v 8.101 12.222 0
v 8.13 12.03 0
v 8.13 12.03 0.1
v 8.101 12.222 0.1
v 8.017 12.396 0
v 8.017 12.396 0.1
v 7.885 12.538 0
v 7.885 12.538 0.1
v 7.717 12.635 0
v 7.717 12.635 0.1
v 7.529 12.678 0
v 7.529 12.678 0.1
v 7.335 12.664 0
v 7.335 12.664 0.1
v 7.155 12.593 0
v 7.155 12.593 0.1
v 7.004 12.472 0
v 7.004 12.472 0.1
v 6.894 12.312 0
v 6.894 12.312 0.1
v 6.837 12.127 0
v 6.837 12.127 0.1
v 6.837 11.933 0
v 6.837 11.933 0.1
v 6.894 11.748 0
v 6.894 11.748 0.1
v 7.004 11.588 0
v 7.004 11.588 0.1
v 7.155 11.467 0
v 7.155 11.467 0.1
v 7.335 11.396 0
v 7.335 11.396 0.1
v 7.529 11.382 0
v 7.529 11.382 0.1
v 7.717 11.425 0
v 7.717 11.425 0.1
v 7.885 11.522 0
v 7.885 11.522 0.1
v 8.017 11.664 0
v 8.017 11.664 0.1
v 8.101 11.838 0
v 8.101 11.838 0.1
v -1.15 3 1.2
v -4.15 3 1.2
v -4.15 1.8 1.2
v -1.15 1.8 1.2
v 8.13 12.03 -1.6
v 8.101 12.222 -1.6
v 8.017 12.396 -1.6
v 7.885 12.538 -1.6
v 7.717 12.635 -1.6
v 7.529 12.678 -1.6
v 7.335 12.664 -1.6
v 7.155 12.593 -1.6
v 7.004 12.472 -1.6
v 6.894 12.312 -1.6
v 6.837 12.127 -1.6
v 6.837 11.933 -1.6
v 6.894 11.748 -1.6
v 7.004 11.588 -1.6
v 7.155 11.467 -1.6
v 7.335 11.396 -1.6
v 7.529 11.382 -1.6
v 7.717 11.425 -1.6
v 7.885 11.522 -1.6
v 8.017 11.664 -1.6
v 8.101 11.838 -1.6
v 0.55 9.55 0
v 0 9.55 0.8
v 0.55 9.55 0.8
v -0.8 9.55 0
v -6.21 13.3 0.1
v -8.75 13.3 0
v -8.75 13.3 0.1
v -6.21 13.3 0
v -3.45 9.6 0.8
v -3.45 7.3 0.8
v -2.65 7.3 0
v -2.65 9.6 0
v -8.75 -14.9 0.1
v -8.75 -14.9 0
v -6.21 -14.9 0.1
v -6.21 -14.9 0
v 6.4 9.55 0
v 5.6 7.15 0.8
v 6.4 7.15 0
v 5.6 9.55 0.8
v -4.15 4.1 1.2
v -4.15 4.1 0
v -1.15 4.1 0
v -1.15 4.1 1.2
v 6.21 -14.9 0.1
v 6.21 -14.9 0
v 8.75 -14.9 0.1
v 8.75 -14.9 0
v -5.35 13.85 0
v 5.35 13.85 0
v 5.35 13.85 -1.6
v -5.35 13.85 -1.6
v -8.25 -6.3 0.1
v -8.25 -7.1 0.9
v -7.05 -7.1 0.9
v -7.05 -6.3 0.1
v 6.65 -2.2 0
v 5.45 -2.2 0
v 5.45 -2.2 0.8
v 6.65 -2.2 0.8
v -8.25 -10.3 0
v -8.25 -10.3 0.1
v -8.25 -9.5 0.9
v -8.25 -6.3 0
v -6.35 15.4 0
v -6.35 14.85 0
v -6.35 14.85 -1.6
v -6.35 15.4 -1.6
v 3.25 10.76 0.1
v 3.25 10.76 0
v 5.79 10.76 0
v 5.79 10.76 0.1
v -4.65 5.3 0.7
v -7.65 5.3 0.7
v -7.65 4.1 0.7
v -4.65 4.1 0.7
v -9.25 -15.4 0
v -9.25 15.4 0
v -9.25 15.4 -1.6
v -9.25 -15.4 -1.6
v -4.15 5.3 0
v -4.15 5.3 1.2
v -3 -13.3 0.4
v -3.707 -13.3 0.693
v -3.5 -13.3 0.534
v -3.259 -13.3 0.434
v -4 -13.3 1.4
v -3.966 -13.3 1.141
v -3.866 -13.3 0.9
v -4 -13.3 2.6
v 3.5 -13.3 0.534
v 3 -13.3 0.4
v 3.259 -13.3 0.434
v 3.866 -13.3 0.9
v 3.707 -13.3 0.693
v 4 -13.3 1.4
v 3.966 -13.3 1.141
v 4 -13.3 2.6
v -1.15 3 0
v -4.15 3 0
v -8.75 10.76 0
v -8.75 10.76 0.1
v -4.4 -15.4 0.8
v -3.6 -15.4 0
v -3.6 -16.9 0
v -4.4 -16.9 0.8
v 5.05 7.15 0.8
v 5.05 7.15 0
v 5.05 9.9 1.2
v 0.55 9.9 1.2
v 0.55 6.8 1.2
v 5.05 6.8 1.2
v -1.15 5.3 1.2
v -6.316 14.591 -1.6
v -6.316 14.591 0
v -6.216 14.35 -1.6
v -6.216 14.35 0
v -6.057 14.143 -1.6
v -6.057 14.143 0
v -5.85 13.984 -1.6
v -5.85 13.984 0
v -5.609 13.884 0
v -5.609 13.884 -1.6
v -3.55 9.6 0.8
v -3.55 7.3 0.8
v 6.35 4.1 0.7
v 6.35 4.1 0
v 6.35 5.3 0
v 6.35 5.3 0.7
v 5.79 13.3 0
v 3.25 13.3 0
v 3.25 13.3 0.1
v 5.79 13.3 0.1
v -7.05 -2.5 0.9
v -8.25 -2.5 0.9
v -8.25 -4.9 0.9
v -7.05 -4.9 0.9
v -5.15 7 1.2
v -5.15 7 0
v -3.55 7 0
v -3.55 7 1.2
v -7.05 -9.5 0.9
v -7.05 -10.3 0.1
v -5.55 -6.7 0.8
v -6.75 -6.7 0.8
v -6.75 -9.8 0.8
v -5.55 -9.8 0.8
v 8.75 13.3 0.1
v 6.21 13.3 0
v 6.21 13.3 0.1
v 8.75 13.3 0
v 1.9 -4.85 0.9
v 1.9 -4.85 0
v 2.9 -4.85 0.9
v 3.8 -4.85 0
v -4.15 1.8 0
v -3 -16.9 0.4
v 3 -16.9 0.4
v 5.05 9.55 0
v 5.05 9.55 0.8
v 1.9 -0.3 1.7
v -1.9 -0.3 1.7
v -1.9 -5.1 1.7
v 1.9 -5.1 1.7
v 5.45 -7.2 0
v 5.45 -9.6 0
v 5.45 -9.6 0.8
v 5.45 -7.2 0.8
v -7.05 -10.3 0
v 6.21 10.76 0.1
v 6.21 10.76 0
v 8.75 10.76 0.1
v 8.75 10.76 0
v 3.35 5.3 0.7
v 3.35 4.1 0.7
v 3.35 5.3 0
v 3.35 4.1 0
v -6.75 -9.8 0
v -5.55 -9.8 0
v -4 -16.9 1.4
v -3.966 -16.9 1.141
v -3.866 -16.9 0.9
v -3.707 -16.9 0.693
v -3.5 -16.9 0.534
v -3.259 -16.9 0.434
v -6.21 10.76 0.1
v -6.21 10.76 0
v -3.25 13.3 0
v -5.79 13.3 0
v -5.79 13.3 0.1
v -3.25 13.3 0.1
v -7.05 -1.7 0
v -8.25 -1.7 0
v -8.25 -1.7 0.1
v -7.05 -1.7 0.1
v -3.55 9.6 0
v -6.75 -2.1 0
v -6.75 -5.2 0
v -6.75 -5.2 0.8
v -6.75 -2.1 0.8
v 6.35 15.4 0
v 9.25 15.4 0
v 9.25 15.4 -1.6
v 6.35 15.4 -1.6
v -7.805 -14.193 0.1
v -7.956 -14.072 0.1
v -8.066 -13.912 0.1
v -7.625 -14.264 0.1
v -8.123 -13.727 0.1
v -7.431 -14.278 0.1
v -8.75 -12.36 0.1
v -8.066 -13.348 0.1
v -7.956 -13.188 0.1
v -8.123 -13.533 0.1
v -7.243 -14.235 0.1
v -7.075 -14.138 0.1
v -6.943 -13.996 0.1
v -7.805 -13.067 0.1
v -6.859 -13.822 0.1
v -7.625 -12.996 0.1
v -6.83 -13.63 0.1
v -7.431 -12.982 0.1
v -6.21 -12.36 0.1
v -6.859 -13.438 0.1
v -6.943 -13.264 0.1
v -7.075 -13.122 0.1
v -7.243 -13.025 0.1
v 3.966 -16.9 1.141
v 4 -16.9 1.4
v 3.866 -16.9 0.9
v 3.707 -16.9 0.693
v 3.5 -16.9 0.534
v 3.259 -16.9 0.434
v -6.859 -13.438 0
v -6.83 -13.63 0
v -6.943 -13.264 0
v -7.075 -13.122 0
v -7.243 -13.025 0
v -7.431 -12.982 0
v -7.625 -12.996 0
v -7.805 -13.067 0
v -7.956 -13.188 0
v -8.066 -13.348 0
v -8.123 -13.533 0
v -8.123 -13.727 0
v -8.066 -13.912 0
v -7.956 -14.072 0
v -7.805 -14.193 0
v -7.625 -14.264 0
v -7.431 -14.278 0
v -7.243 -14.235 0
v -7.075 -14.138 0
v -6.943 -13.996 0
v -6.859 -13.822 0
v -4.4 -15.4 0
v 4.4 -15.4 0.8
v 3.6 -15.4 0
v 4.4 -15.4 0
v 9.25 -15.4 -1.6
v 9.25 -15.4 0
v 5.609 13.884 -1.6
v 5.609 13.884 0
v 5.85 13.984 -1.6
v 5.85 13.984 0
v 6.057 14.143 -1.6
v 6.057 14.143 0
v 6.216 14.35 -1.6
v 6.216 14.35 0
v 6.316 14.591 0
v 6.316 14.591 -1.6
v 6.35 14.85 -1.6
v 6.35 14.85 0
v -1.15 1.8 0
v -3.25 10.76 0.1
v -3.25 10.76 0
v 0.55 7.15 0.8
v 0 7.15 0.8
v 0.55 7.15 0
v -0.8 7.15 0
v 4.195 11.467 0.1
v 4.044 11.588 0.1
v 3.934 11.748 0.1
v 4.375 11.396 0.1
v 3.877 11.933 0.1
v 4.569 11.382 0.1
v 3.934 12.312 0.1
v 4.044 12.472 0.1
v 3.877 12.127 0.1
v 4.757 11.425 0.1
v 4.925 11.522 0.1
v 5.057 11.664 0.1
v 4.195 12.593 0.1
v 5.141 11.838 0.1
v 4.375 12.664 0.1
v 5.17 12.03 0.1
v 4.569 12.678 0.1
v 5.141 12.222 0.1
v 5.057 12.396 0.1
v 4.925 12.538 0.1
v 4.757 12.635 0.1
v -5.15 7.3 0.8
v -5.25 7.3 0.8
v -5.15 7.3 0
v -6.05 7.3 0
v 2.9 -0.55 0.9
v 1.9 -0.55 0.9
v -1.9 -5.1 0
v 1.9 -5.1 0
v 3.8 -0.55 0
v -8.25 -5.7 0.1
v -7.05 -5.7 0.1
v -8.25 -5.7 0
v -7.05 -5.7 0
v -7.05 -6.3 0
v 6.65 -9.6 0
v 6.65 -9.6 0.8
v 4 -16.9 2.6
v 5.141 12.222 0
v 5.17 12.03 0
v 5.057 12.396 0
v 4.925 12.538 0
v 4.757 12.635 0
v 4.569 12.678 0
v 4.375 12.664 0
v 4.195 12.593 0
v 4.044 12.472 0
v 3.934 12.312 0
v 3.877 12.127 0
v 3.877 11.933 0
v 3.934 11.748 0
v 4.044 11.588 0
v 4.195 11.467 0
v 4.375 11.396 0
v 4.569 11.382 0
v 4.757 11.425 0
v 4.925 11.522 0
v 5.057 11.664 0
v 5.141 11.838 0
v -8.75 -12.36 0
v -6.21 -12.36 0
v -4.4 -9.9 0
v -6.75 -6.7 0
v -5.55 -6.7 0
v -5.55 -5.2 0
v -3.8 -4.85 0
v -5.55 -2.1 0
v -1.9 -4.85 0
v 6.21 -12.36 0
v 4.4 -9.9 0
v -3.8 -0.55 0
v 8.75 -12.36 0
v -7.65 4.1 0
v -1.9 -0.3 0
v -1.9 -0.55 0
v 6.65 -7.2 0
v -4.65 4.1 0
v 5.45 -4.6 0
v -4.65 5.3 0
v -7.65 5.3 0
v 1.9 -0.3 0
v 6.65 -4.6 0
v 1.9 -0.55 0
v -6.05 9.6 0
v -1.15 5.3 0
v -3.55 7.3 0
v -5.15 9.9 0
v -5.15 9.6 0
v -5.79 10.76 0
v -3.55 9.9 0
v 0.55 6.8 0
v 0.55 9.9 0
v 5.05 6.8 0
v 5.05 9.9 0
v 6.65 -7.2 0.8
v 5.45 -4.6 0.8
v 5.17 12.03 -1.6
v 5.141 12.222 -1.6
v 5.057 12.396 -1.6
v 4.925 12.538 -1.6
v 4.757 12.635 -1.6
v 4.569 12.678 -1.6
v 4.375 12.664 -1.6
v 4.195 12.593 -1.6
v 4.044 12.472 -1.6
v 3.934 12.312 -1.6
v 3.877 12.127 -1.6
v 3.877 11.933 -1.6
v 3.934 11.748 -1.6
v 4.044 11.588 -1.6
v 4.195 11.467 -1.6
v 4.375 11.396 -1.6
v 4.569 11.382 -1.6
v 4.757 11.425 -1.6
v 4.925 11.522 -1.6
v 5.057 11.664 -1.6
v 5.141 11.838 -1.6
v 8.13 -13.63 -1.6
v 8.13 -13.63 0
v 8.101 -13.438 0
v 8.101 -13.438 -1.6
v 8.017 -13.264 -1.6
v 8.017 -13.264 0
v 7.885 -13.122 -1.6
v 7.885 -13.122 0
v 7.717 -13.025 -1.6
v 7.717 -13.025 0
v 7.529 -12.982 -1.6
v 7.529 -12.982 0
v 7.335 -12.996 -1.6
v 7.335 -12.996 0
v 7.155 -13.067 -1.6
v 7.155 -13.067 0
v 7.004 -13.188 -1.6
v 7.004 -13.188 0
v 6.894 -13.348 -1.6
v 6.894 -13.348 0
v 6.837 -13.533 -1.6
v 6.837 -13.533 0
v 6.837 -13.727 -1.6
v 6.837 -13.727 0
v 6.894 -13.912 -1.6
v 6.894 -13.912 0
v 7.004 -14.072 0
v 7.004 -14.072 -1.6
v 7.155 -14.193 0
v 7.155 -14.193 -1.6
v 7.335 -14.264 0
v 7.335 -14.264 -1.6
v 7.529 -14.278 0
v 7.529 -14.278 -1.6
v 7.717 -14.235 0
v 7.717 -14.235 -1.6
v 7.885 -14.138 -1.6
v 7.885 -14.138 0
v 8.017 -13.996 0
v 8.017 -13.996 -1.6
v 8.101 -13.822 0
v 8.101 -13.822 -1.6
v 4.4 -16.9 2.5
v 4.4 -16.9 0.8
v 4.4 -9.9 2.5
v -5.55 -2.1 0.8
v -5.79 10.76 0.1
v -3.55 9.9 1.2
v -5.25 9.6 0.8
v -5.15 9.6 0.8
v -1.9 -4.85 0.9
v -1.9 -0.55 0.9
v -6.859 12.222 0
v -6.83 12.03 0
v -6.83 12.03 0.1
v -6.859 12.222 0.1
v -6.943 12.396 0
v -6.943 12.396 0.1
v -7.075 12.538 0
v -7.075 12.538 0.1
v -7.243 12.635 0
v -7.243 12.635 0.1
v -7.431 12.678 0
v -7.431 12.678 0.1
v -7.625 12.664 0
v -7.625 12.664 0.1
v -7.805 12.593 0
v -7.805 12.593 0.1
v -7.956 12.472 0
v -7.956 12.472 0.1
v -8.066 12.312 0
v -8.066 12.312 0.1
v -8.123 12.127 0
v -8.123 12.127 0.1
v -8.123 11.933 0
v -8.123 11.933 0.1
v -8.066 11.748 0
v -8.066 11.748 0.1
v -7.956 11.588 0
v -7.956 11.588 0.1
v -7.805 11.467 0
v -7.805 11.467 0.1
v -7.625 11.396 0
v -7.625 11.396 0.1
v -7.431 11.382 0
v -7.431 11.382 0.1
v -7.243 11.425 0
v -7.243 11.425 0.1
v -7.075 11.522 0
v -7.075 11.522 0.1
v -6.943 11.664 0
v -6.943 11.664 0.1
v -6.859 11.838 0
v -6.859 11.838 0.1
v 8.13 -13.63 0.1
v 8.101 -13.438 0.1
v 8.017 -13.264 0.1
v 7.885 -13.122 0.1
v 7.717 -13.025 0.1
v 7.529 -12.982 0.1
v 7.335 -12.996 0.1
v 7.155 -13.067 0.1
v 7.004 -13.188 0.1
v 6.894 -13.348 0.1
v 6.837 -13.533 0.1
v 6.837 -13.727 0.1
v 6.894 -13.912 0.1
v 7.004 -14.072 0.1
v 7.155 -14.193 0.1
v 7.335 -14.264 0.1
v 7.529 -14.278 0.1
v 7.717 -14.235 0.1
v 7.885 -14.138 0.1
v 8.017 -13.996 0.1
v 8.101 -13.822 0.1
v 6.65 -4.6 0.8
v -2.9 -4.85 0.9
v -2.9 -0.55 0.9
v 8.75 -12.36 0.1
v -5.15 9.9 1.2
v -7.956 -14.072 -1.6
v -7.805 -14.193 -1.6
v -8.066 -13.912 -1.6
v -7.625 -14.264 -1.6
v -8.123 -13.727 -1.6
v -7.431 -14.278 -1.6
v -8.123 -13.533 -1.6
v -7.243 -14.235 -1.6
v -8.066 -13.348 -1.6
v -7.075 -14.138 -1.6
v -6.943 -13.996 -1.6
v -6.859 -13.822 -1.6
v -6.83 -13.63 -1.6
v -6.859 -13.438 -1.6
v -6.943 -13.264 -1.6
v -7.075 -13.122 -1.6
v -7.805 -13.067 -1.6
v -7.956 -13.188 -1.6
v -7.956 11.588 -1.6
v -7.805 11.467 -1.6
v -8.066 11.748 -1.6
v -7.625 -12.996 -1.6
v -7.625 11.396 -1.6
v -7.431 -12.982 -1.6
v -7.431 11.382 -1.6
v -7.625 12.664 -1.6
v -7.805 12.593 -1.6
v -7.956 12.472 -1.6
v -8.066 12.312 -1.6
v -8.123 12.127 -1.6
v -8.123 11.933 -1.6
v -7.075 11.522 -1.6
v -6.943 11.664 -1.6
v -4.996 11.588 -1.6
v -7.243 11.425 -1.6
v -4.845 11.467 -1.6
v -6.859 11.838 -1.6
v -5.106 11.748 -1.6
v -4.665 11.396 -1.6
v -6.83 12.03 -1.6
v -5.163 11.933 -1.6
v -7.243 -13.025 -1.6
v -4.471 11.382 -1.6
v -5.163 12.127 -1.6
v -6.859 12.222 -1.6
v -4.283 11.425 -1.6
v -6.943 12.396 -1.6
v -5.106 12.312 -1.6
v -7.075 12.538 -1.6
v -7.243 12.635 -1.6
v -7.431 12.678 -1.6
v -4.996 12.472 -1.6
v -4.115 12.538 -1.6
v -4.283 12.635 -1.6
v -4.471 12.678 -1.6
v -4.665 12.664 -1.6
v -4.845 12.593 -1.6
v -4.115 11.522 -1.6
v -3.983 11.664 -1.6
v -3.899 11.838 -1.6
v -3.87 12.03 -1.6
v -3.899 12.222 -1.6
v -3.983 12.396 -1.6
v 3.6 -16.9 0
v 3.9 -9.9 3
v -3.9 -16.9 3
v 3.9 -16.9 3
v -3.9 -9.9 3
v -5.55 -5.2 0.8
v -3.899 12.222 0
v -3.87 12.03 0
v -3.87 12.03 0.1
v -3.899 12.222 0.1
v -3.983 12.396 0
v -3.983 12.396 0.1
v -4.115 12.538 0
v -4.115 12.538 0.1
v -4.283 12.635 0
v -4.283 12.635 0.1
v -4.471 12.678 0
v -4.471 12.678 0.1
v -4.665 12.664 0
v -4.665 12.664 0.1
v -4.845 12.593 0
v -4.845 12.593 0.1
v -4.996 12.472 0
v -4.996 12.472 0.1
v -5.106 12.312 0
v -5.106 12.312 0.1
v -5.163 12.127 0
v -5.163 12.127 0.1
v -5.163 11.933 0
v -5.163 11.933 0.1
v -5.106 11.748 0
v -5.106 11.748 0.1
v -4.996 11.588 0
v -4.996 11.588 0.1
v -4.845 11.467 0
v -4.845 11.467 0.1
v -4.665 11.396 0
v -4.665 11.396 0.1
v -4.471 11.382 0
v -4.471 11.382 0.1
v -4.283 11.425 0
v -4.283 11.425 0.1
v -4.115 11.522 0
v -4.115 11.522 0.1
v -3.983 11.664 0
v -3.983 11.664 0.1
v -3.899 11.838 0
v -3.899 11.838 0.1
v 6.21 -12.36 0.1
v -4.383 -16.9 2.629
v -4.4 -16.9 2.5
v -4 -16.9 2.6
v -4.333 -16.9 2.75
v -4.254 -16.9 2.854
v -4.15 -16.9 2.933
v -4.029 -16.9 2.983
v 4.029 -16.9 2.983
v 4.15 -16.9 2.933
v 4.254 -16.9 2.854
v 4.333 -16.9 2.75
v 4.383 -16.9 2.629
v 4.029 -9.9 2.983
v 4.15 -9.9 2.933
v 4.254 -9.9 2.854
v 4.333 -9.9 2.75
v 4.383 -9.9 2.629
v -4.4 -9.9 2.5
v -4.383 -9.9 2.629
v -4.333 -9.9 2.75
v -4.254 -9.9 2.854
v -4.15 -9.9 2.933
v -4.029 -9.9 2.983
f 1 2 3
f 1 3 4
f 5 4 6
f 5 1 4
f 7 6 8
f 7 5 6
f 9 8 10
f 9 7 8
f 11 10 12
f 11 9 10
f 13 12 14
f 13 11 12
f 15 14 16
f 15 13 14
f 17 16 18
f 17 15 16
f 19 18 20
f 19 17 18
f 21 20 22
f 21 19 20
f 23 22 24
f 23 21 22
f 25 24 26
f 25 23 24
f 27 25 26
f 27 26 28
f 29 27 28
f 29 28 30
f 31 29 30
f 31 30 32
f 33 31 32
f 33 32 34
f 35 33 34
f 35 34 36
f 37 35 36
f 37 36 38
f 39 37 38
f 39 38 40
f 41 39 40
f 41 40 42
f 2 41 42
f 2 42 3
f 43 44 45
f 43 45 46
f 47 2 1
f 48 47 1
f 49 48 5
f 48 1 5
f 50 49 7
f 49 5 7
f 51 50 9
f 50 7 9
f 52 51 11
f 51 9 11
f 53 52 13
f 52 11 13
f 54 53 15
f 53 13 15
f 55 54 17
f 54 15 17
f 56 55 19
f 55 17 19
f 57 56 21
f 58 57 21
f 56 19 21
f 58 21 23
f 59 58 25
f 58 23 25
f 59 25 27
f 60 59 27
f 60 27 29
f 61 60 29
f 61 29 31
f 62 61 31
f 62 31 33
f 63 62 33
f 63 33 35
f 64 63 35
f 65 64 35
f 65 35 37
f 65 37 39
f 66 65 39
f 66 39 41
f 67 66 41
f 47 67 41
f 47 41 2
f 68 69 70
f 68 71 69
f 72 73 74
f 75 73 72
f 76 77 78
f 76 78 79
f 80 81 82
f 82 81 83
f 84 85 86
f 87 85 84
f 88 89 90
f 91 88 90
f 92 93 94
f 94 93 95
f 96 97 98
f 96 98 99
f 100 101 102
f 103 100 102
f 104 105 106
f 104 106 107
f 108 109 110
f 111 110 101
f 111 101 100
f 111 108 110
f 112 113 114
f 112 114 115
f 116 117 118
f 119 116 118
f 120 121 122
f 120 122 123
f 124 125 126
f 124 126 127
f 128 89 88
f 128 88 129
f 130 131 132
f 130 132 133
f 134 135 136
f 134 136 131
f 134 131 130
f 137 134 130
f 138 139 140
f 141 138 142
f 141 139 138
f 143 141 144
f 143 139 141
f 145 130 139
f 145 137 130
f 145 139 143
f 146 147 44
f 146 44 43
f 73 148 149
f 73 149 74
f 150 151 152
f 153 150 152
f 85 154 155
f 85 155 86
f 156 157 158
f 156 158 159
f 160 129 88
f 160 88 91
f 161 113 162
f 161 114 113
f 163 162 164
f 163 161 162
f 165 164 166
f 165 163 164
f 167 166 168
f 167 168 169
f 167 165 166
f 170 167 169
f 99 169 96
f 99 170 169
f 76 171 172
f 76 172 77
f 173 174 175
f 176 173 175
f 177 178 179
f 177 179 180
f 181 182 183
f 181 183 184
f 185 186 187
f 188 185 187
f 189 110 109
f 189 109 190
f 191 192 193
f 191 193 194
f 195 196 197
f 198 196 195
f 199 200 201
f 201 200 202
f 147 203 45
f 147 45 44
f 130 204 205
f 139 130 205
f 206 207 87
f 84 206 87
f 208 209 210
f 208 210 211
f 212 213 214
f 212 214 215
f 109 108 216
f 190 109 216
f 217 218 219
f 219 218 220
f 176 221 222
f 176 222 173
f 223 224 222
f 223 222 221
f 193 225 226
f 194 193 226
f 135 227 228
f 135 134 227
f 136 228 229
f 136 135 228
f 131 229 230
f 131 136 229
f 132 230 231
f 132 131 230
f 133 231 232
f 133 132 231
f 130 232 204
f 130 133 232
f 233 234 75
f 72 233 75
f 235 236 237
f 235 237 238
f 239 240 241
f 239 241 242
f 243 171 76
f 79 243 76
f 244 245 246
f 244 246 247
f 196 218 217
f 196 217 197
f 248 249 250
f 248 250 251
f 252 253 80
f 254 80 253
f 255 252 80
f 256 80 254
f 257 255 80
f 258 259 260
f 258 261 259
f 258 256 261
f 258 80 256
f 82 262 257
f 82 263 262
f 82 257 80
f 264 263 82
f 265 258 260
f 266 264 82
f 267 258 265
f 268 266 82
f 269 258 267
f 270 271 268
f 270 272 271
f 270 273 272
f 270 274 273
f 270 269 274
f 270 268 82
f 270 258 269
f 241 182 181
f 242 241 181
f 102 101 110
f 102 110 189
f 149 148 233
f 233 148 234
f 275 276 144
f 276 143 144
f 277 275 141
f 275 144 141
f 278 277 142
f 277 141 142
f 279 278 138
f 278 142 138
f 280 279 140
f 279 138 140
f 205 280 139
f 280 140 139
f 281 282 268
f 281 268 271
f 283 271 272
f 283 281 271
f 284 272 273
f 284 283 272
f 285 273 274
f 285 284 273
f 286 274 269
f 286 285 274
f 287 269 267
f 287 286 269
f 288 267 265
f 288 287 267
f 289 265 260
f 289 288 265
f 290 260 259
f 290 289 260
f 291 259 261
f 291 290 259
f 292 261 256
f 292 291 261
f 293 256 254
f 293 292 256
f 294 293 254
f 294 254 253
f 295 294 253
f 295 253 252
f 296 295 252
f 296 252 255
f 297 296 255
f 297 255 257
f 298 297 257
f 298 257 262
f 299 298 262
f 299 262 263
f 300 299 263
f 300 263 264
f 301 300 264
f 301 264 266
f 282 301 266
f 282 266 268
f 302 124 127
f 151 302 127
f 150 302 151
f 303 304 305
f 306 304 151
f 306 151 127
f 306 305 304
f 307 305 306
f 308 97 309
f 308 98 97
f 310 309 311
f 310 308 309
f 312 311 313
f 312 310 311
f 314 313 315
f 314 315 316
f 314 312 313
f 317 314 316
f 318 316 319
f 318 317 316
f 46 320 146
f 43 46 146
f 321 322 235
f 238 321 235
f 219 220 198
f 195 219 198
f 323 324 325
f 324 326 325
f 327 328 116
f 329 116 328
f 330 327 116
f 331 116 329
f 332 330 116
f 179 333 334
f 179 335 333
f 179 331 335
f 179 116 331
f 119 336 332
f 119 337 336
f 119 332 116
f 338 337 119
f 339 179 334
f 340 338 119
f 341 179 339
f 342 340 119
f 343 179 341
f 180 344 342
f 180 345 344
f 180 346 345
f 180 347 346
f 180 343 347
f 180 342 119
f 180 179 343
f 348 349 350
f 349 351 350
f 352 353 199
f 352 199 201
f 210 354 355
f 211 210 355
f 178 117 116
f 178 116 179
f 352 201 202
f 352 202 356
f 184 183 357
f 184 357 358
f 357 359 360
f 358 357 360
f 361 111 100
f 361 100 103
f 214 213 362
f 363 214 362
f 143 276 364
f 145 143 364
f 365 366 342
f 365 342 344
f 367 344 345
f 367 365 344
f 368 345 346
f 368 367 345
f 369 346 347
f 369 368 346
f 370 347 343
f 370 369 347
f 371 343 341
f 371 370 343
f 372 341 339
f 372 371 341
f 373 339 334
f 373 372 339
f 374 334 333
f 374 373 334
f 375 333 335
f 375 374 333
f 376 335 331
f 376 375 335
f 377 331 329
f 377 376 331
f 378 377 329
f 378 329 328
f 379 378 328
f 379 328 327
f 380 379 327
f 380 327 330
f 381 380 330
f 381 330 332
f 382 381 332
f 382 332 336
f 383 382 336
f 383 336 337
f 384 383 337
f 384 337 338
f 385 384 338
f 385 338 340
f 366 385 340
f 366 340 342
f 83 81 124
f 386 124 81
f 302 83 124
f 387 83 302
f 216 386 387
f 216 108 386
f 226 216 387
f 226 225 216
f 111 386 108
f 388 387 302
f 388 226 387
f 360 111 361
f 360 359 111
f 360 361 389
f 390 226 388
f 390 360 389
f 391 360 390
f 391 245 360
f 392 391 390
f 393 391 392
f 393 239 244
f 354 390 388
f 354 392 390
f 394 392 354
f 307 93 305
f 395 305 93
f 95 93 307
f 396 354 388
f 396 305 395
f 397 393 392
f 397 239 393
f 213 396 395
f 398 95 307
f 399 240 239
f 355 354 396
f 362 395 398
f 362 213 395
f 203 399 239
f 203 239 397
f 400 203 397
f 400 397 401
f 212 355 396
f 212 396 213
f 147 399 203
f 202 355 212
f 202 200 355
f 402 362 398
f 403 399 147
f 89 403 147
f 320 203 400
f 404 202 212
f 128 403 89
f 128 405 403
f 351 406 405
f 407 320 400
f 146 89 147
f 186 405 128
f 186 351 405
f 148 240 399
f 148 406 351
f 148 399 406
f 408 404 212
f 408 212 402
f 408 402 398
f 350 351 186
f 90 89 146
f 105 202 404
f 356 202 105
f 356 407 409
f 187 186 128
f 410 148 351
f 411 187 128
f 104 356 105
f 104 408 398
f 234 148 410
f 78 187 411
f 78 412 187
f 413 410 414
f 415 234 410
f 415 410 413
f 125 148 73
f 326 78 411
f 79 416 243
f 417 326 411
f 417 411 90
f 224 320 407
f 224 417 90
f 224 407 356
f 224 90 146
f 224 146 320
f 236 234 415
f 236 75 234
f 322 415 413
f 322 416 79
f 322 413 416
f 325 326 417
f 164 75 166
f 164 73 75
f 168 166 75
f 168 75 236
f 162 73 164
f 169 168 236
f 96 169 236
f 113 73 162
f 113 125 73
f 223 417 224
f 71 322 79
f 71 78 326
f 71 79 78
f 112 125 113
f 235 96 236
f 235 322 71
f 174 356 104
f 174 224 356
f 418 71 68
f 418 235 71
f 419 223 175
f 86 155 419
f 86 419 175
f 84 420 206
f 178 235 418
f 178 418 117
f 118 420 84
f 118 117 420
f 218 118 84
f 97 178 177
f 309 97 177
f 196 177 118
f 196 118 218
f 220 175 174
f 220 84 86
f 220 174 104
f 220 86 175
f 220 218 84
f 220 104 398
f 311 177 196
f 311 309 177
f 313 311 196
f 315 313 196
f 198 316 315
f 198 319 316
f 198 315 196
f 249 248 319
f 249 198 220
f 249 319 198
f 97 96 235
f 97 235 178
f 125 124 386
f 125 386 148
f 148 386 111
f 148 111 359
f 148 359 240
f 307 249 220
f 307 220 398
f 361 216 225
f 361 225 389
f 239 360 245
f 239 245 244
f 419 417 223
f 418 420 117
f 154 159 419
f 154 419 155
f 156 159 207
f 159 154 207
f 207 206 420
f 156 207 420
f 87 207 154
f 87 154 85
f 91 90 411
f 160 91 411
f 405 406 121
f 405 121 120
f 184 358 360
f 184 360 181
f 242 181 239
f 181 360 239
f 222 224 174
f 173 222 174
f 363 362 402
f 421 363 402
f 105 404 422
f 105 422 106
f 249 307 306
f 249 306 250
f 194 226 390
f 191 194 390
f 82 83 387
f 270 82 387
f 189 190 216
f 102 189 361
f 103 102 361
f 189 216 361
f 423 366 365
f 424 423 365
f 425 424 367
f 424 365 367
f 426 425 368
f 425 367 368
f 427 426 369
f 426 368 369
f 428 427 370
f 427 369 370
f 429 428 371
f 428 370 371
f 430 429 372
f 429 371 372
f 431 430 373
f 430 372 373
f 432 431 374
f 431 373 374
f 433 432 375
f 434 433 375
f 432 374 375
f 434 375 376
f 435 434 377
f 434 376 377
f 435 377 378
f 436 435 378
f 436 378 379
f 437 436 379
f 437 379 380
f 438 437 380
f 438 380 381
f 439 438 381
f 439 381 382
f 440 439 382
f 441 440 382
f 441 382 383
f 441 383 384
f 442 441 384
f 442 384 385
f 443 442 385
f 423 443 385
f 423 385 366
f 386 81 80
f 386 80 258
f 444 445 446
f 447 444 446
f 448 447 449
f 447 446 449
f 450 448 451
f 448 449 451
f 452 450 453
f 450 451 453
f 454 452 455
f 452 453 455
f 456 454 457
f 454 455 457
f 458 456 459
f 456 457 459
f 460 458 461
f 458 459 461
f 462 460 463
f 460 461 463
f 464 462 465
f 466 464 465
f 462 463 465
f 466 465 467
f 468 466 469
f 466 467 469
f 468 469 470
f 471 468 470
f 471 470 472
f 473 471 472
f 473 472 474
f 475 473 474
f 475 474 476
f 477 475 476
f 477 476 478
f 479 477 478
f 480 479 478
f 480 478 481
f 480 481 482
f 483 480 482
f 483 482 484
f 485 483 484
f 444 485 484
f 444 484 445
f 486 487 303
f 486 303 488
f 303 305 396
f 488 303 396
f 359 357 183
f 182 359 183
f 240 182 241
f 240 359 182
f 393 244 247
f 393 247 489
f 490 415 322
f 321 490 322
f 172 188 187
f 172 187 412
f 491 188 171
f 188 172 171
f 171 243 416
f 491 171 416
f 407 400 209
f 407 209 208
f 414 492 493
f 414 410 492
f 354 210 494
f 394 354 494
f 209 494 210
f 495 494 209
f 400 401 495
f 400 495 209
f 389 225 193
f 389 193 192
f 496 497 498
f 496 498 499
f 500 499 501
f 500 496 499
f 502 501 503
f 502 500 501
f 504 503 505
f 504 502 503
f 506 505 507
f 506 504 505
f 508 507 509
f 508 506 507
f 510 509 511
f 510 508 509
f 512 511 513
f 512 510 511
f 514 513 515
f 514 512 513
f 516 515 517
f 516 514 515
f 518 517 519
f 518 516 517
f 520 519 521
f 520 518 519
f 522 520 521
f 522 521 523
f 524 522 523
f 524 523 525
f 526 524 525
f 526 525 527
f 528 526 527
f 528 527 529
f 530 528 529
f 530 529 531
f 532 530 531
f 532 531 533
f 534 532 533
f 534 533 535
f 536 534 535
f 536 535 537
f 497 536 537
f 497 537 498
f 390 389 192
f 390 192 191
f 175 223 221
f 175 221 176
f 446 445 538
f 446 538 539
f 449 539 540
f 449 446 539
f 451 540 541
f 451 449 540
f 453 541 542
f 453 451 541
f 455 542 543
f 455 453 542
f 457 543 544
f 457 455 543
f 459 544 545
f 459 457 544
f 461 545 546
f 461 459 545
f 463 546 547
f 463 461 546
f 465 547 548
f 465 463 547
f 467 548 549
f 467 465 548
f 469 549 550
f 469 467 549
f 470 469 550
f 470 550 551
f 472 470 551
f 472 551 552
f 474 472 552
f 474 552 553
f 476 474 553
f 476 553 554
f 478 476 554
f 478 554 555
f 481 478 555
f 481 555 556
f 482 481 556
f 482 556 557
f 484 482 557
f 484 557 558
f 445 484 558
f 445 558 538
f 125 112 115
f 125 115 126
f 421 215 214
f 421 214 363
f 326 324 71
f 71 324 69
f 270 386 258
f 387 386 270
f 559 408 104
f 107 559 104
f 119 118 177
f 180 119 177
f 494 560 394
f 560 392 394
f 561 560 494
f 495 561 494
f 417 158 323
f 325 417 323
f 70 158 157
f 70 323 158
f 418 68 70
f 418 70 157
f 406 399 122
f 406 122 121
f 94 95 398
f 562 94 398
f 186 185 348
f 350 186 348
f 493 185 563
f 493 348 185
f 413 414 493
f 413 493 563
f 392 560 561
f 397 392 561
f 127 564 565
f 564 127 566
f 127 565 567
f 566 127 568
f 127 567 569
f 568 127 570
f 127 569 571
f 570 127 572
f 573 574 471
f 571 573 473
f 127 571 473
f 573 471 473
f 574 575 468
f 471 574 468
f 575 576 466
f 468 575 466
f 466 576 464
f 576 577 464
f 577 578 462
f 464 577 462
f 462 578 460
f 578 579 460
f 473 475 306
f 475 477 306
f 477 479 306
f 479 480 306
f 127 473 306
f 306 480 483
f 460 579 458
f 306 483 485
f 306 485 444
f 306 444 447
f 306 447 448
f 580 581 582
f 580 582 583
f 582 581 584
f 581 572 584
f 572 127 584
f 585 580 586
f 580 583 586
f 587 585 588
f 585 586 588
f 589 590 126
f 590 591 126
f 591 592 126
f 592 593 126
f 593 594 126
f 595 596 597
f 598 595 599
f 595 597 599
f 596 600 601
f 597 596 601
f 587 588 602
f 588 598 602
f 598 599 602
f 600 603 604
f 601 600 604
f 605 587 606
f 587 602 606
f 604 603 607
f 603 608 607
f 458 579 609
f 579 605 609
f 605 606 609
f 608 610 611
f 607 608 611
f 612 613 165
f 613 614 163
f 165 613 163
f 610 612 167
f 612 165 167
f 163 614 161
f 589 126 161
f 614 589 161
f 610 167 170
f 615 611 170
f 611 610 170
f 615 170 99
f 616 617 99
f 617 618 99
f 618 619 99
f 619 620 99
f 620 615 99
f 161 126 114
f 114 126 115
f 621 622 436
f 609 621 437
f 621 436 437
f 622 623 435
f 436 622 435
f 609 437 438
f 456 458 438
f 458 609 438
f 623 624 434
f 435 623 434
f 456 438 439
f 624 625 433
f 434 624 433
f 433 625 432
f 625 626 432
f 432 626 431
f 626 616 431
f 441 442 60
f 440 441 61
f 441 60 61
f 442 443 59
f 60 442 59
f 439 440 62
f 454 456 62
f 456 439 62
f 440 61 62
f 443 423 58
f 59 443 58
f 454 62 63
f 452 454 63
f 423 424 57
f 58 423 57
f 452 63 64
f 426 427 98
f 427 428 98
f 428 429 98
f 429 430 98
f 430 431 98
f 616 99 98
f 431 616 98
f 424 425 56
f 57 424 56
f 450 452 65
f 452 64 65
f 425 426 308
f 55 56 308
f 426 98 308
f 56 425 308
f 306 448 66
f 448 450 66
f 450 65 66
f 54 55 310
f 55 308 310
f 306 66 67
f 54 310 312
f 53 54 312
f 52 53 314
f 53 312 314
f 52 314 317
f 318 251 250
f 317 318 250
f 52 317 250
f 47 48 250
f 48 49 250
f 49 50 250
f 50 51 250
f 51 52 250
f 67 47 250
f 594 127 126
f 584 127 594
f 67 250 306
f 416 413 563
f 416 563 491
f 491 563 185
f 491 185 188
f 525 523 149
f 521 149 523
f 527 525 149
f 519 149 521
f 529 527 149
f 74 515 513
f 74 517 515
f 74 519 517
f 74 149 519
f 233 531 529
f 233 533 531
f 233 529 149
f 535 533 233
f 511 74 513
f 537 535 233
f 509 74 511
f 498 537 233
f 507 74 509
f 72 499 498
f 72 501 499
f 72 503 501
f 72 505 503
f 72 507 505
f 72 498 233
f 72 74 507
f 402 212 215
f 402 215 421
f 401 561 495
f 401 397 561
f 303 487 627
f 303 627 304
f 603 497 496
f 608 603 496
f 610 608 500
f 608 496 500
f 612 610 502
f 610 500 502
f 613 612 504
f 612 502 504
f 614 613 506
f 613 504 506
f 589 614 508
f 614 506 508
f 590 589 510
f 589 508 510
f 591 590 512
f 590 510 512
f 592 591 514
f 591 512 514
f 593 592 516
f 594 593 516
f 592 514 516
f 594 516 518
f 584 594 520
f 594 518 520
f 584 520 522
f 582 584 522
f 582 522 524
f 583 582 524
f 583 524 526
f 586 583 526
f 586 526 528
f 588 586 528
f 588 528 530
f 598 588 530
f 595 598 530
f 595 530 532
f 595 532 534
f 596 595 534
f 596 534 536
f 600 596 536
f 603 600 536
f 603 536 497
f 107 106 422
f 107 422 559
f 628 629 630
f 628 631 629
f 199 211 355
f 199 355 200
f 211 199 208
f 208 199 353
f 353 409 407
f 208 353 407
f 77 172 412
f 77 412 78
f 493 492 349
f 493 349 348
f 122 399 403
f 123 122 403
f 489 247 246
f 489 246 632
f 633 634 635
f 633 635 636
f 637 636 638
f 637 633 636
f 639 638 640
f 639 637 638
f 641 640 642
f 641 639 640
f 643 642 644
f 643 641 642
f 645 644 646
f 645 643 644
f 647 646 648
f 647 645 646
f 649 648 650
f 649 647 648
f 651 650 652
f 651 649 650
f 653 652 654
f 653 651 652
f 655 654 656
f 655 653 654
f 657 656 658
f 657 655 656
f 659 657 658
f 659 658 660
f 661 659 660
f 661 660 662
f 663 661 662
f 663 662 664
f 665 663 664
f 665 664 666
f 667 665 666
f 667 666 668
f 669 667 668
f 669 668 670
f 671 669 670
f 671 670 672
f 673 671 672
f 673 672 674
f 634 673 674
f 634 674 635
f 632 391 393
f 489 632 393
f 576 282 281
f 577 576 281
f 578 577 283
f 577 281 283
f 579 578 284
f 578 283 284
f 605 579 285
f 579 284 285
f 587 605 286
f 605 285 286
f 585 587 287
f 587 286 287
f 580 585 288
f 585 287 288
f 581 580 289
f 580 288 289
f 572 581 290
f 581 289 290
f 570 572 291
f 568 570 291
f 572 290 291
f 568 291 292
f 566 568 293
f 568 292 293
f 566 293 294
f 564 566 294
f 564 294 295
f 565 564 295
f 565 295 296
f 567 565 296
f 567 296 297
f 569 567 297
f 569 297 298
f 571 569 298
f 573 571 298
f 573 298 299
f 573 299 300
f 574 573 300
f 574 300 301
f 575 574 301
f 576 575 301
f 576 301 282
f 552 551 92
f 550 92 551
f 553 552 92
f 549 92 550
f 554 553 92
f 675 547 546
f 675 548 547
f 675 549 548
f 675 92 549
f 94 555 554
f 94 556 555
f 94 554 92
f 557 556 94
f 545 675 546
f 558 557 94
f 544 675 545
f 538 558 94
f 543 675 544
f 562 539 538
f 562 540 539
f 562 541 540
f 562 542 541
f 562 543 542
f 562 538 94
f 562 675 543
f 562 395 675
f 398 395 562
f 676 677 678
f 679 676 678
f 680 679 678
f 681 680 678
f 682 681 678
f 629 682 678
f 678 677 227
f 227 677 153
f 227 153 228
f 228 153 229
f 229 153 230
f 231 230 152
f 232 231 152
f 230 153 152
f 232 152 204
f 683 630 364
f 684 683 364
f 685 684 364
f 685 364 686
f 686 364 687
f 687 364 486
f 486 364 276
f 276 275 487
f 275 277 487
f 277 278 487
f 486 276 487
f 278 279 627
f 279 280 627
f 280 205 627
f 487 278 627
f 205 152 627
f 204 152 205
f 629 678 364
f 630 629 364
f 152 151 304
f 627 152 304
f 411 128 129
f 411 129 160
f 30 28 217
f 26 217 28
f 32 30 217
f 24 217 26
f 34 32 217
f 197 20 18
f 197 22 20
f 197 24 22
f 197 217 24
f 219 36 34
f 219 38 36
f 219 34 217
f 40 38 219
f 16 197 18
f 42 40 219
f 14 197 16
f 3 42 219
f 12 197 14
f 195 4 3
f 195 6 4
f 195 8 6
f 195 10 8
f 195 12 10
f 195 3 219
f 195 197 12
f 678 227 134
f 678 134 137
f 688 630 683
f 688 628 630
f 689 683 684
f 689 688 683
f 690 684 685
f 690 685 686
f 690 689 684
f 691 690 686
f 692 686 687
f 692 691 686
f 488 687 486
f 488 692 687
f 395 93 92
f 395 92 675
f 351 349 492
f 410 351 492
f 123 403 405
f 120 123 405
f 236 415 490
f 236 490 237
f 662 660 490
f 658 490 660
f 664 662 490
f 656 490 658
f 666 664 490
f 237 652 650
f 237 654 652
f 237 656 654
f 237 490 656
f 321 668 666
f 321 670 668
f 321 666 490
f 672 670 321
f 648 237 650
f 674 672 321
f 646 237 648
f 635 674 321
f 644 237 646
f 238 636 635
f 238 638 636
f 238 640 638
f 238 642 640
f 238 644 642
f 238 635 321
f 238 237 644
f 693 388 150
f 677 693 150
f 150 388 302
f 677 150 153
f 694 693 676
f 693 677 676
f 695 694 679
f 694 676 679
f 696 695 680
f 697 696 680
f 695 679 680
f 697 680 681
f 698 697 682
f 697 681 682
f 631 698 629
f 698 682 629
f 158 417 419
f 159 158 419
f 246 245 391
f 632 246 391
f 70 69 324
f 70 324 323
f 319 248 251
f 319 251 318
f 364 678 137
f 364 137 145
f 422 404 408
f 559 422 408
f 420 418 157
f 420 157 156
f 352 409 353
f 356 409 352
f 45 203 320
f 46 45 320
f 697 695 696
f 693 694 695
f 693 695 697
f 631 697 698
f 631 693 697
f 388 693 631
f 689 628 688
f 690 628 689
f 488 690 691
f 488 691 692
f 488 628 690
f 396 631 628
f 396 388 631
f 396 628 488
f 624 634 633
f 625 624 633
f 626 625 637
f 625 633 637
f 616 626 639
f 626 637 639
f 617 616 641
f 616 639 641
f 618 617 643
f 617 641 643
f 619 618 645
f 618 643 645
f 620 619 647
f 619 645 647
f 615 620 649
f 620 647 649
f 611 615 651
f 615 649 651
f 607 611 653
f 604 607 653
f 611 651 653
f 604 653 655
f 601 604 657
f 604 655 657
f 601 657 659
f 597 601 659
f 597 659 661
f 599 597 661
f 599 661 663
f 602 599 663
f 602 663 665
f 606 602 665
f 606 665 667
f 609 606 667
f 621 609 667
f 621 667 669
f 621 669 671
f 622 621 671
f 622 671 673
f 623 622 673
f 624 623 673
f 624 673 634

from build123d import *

# Parameters (mm, degrees)
SKICA1_W                      = 8.8
SKICA1_H                      = 5.5
SKICA1_W_2                    = 1.9
SKICA1_H_2                    = 4.3
SKICA1_W_3                    = 3.8
SKICA1_H_3                    = 0.25
P_IDAT_VYSUNUT_M1_DEPTH       = 1.6
ZAOBLIT1_R                    = 1
SKICA1_3_W                    = 8.8
SKICA1_3_H                    = 5.5
SKICA1_3_H_2                  = 1.5
P_IDAT_VYSUNUT_M2_DEPTH       = 3
SKICA1_4_W                    = 3.8
SKICA1_4_H                    = 4.8
P_IDAT_VYSUNUT_M3_DEPTH       = 1.7
SKICA1_5_W                    = 7.6
SKICA1_5_H                    = 4.3
P_IDAT_VYSUNUT_M4_DEPTH       = 0.9
ZKOSEN_1_SIZE                 = 0.9
SKICA2_W                      = 4.5
SKICA2_H                      = 3.1
SKICA2_W_2                    = 1.6
SKICA2_H_2                    = 2.9
P_IDAT_VYSUNUT_M5_DEPTH       = 1.2
SKICA2_3_W                    = 7.2
SKICA2_3_H                    = 2.4
SKICA2_3_W_2                  = 3.4
SKICA2_3_H_2                  = 2.3
P_IDAT_VYSUNUT_M6_DEPTH       = 0.8
ZKOSEN_2_SIZE                 = 0.8
SKICA3_W                      = 8
SKICA3_H                      = 2.2
ODEBRAT_VYSUNUT_M1_DEPTH      = 3.6
ZAOBLIT2_R                    = 1
ZKOSEN_3_SIZE                 = 0.8
ZAOBLIT3_R                    = 0.5
SKICA4_W                      = 1.2
SKICA4_H                      = 2.4
P_IDAT_VYSUNUT_M7_DEPTH       = 0.8
SKICA5_W                      = 3
SKICA5_H                      = 1.2
P_IDAT_VYSUNUT_M8_DEPTH       = 0.7
SKICA5_3_W                    = 3
SKICA5_3_H                    = 1.2
P_IDAT_VYSUNUT_M9_DEPTH       = 1.2
SKICA6_W                      = 1.2
SKICA6_H                      = 3.1
P_IDAT_VYSUNUT_M10_DEPTH      = 0.8
SKICA6_3_W                    = 1.2
SKICA6_3_H                    = 4
P_IDAT_VYSUNUT_M11_DEPTH      = 0.9
ZKOSEN_4_SIZE                 = 0.8
P_IDAT_VYSUNUT_M12_DEPTH      = 0.1
P_IDAT_VYSUNUT_M12_DEPTH_BACK = 1.2
SKICA7_W                      = 2.54
SKICA7_H                      = 2.54
SKICA7_R                      = 0.65
SKICA7_2_R                    = 0.65
ODEBRAT_VYSUNUT_M2_DEPTH      = 20.498012719


with BuildPart() as part:
    # Skica1 → Přidat vysunutím1 (new body)
    # profile 1 of 7: a face of its own
    with BuildSketch(Plane.XY):
        Polygon((-9.25, 15.4), (-9.25, -15.4), (-4.4, -15.4), (-4.4, -9.9), (4.4, -9.9), (4.4, -15.4), (9.25, -15.4), (9.25, 15.4), (6.35, 15.4), (6.35, 13.85), (-6.35, 13.85), (-6.35, 15.4), align=None)
        Polygon((-1.9, -0.55), (-1.9, -0.3), (1.9, -0.3), (1.9, -0.55), (3.8, -0.55), (3.8, -4.85), (1.9, -4.85), (1.9, -5.1), (-1.9, -5.1), (-1.9, -4.85), (-3.8, -4.85), (-3.8, -0.55), align=None, mode=Mode.SUBTRACT)
    # profile 2 of 7: a face of its own
    with BuildSketch(Plane.XY):
        with Locations((0, -12.65)):
            Rectangle(SKICA1_W, SKICA1_H)
    # profile 3 of 7: a face of its own
    with BuildSketch(Plane.XY):
        with Locations((2.85, -2.7)):
            Rectangle(SKICA1_W_2, SKICA1_H_2)
    # profile 4 of 7: a face of its own
    with BuildSketch(Plane.XY):
        with Locations((-2.85, -2.7)):
            Rectangle(SKICA1_W_2, SKICA1_H_2)
    # profile 5 of 7: a face of its own
    with BuildSketch(Plane.XY):
        with Locations((0, -2.7)):
            Rectangle(SKICA1_W_3, SKICA1_H_2)
    # profile 6 of 7: a face of its own
    with BuildSketch(Plane.XY):
        with Locations((0, -4.975)):
            Rectangle(SKICA1_W_3, SKICA1_H_3)
    # profile 7 of 7: a face of its own
    with BuildSketch(Plane.XY):
        with Locations((0, -0.425)):
            Rectangle(SKICA1_W_3, SKICA1_H_3)
    extrude(amount=-P_IDAT_VYSUNUT_M1_DEPTH)

    # Zaoblit1
    zaoblit1_edges = [part.edges().sort_by_distance(p)[0] for p in [
        (-6.35, 13.85, -0.8),
        (6.35, 13.85, -0.8),
    ]]
    fillet(zaoblit1_edges, radius=ZAOBLIT1_R)

    # Skica1<3> → Přidat vysunutím2 (add)
    with BuildSketch(Plane.XY):
        with Locations((0, -12.65)):
            Rectangle(SKICA1_3_W, SKICA1_3_H)
        with Locations((0, -16.15)):
            Rectangle(SKICA1_3_W, SKICA1_3_H_2)
    extrude(amount=P_IDAT_VYSUNUT_M2_DEPTH)

    # Skica1<4> → Přidat vysunutím3 (add)
    with BuildSketch(Plane.XY):
        with Locations((0, -2.7)):
            Rectangle(SKICA1_4_W, SKICA1_4_H)
    extrude(amount=P_IDAT_VYSUNUT_M3_DEPTH)

    # Skica1<5> → Přidat vysunutím4 (add)
    with BuildSketch(Plane.XY):
        with Locations((0, -2.7)):
            Rectangle(SKICA1_5_W, SKICA1_5_H)
    extrude(amount=P_IDAT_VYSUNUT_M4_DEPTH)

    # Zkosení1
    zkosen_1_edges = [part.edges().sort_by_distance(p)[0] for p in [
        (-3.8, -2.7, 0.9),
        (3.8, -2.7, 0.9),
    ]]
    chamfer(zkosen_1_edges, length=ZKOSEN_1_SIZE - 0.0001)  # a hair under: the kernel refuses the full size

    # Skica2 → Přidat vysunutím5 (add)
    with BuildSketch(Plane.XY):
        with Locations((2.8, 8.35)):
            Rectangle(SKICA2_W, SKICA2_H)
        with Locations((-4.35, 8.45)):
            Rectangle(SKICA2_W_2, SKICA2_H_2)
    extrude(amount=P_IDAT_VYSUNUT_M5_DEPTH)

    # Skica2<3> → Přidat vysunutím6 (add)
    with BuildSketch(Plane.XY):
        with Locations((2.8, 8.35)):
            Rectangle(SKICA2_3_W, SKICA2_3_H)
        with Locations((-4.35, 8.45)):
            Rectangle(SKICA2_3_W_2, SKICA2_3_H_2)
    extrude(amount=P_IDAT_VYSUNUT_M6_DEPTH)

    # Zkosení2
    zkosen_2_edges = [part.edges().sort_by_distance(p)[0] for p in [
        (6.4, 8.35, 0.8),
        (-0.8, 8.35, 0.8),
        (-2.65, 8.45, 0.8),
        (-6.05, 8.45, 0.8),
    ]]
    chamfer(zkosen_2_edges, length=ZKOSEN_2_SIZE - 0.0001)  # a hair under: the kernel refuses the full size

    # Skica3 → Odebrat vysunutím1 (cut)
    with BuildSketch(Plane.XZ.offset(16.9)):
        with Locations((0, 1.5)):
            Rectangle(SKICA3_W, SKICA3_H)
    extrude(amount=-ODEBRAT_VYSUNUT_M1_DEPTH, mode=Mode.SUBTRACT)

    # Zaoblit2
    zaoblit2_edges = [part.edges().sort_by_distance(p)[0] for p in [
        (4, -15.1, 0.4),
        (-4, -15.1, 0.4),
    ]]
    fillet(zaoblit2_edges, radius=ZAOBLIT2_R)

    # Zkosení3
    zkosen_3_edges = [part.edges().sort_by_distance(p)[0] for p in [
        (4.4, -16.15, 0),
        (-4.4, -16.15, 0),
    ]]
    chamfer(zkosen_3_edges, length=ZKOSEN_3_SIZE)

    # Zaoblit3
    zaoblit3_edges = [part.edges().sort_by_distance(p)[0] for p in [
        (4.4, -13.4, 3),
        (-4.4, -13.4, 3),
    ]]
    fillet(zaoblit3_edges, radius=ZAOBLIT3_R)

    # Skica4 → Přidat vysunutím7 (add)
    with BuildSketch(Plane.XY):
        with Locations((6.05, -3.4)):
            Rectangle(SKICA4_W, SKICA4_H)
        with Locations((6.05, -8.4)):
            Rectangle(SKICA4_W, SKICA4_H)
    extrude(amount=P_IDAT_VYSUNUT_M7_DEPTH)

    # Skica5 → Přidat vysunutím8 (add)
    with BuildSketch(Plane.XY):
        with Locations((-6.15, 4.7)):
            Rectangle(SKICA5_W, SKICA5_H)
        with Locations((4.85, 4.7)):
            Rectangle(SKICA5_W, SKICA5_H)
    extrude(amount=P_IDAT_VYSUNUT_M8_DEPTH)

    # Skica5<3> → Přidat vysunutím9 (add)
    with BuildSketch(Plane.XY):
        with Locations((-2.65, 4.7)):
            Rectangle(SKICA5_3_W, SKICA5_3_H)
        with Locations((-2.65, 2.4)):
            Rectangle(SKICA5_3_W, SKICA5_3_H)
    extrude(amount=P_IDAT_VYSUNUT_M9_DEPTH)

    # Skica6 → Přidat vysunutím10 (add)
    with BuildSketch(Plane.XY):
        with Locations((-6.15, -3.65)):
            Rectangle(SKICA6_W, SKICA6_H)
        with Locations((-6.15, -8.25)):
            Rectangle(SKICA6_W, SKICA6_H)
    extrude(amount=P_IDAT_VYSUNUT_M10_DEPTH)

    # Skica6<3> → Přidat vysunutím11 (add)
    with BuildSketch(Plane.XY):
        with Locations((-7.65, -8.3)):
            Rectangle(SKICA6_3_W, SKICA6_3_H)
        with Locations((-7.65, -3.7)):
            Rectangle(SKICA6_3_W, SKICA6_3_H)
    extrude(amount=P_IDAT_VYSUNUT_M11_DEPTH)

    # Zkosení4
    zkosen_4_edges = [part.edges().sort_by_distance(p)[0] for p in [
        (-7.65, -6.3, 0.9),
        (-7.65, -10.3, 0.9),
        (-7.65, -1.7, 0.9),
        (-7.65, -5.7, 0.9),
    ]]
    chamfer(zkosen_4_edges, length=ZKOSEN_4_SIZE)

    # Skica7 → Přidat vysunutím12 (add, two sides: drawn at the far end of the back side and taken through both)
    # profile 1 of 6: a face of its own
    with BuildSketch(Plane.XY.offset(-P_IDAT_VYSUNUT_M12_DEPTH_BACK)):
        with Locations((-7.48, 12.03)):
            Rectangle(SKICA7_W, SKICA7_H)
        with Locations((-7.48, 12.03)):
            Circle(SKICA7_R, mode=Mode.SUBTRACT)
    # profile 2 of 6: a face of its own
    with BuildSketch(Plane.XY.offset(-P_IDAT_VYSUNUT_M12_DEPTH_BACK)):
        with Locations((-4.52, 12.03)):
            Rectangle(SKICA7_W, SKICA7_H)
        with Locations((-4.52, 12.03)):
            Circle(SKICA7_R, mode=Mode.SUBTRACT)
    # profile 3 of 6: a face of its own
    with BuildSketch(Plane.XY.offset(-P_IDAT_VYSUNUT_M12_DEPTH_BACK)):
        with Locations((-7.48, -13.63)):
            Rectangle(SKICA7_W, SKICA7_H)
        with Locations((-7.48, -13.63)):
            Circle(SKICA7_R, mode=Mode.SUBTRACT)
    # profile 4 of 6: a face of its own
    with BuildSketch(Plane.XY.offset(-P_IDAT_VYSUNUT_M12_DEPTH_BACK)):
        with Locations((7.48, -13.63)):
            Rectangle(SKICA7_W, SKICA7_H)
        with Locations((7.48, -13.63)):
            Circle(SKICA7_R, mode=Mode.SUBTRACT)
    # profile 5 of 6: a face of its own
    with BuildSketch(Plane.XY.offset(-P_IDAT_VYSUNUT_M12_DEPTH_BACK)):
        with Locations((4.52, 12.03)):
            Rectangle(SKICA7_W, SKICA7_H)
        with Locations((4.52, 12.03)):
            Circle(SKICA7_R, mode=Mode.SUBTRACT)
    # profile 6 of 6: a face of its own
    with BuildSketch(Plane.XY.offset(-P_IDAT_VYSUNUT_M12_DEPTH_BACK)):
        with Locations((7.48, 12.03)):
            Rectangle(SKICA7_W, SKICA7_H)
        with Locations((7.48, 12.03)):
            Circle(SKICA7_R, mode=Mode.SUBTRACT)
    extrude(amount=P_IDAT_VYSUNUT_M12_DEPTH + P_IDAT_VYSUNUT_M12_DEPTH_BACK)

    # Skica7<2> → Odebrat vysunutím2 (cut, through all)
    with BuildSketch(Plane.XY):
        with Locations((-7.48, -13.63)):
            Circle(SKICA7_2_R)
        with Locations((7.48, -13.63)):
            Circle(SKICA7_2_R)
        with Locations((-7.48, 12.03)):
            Circle(SKICA7_2_R)
        with Locations((-4.52, 12.03)):
            Circle(SKICA7_2_R)
        with Locations((4.52, 12.03)):
            Circle(SKICA7_2_R)
        with Locations((7.48, 12.03)):
            Circle(SKICA7_2_R)
    extrude(amount=-ODEBRAT_VYSUNUT_M2_DEPTH, mode=Mode.SUBTRACT)


solid = part.part
